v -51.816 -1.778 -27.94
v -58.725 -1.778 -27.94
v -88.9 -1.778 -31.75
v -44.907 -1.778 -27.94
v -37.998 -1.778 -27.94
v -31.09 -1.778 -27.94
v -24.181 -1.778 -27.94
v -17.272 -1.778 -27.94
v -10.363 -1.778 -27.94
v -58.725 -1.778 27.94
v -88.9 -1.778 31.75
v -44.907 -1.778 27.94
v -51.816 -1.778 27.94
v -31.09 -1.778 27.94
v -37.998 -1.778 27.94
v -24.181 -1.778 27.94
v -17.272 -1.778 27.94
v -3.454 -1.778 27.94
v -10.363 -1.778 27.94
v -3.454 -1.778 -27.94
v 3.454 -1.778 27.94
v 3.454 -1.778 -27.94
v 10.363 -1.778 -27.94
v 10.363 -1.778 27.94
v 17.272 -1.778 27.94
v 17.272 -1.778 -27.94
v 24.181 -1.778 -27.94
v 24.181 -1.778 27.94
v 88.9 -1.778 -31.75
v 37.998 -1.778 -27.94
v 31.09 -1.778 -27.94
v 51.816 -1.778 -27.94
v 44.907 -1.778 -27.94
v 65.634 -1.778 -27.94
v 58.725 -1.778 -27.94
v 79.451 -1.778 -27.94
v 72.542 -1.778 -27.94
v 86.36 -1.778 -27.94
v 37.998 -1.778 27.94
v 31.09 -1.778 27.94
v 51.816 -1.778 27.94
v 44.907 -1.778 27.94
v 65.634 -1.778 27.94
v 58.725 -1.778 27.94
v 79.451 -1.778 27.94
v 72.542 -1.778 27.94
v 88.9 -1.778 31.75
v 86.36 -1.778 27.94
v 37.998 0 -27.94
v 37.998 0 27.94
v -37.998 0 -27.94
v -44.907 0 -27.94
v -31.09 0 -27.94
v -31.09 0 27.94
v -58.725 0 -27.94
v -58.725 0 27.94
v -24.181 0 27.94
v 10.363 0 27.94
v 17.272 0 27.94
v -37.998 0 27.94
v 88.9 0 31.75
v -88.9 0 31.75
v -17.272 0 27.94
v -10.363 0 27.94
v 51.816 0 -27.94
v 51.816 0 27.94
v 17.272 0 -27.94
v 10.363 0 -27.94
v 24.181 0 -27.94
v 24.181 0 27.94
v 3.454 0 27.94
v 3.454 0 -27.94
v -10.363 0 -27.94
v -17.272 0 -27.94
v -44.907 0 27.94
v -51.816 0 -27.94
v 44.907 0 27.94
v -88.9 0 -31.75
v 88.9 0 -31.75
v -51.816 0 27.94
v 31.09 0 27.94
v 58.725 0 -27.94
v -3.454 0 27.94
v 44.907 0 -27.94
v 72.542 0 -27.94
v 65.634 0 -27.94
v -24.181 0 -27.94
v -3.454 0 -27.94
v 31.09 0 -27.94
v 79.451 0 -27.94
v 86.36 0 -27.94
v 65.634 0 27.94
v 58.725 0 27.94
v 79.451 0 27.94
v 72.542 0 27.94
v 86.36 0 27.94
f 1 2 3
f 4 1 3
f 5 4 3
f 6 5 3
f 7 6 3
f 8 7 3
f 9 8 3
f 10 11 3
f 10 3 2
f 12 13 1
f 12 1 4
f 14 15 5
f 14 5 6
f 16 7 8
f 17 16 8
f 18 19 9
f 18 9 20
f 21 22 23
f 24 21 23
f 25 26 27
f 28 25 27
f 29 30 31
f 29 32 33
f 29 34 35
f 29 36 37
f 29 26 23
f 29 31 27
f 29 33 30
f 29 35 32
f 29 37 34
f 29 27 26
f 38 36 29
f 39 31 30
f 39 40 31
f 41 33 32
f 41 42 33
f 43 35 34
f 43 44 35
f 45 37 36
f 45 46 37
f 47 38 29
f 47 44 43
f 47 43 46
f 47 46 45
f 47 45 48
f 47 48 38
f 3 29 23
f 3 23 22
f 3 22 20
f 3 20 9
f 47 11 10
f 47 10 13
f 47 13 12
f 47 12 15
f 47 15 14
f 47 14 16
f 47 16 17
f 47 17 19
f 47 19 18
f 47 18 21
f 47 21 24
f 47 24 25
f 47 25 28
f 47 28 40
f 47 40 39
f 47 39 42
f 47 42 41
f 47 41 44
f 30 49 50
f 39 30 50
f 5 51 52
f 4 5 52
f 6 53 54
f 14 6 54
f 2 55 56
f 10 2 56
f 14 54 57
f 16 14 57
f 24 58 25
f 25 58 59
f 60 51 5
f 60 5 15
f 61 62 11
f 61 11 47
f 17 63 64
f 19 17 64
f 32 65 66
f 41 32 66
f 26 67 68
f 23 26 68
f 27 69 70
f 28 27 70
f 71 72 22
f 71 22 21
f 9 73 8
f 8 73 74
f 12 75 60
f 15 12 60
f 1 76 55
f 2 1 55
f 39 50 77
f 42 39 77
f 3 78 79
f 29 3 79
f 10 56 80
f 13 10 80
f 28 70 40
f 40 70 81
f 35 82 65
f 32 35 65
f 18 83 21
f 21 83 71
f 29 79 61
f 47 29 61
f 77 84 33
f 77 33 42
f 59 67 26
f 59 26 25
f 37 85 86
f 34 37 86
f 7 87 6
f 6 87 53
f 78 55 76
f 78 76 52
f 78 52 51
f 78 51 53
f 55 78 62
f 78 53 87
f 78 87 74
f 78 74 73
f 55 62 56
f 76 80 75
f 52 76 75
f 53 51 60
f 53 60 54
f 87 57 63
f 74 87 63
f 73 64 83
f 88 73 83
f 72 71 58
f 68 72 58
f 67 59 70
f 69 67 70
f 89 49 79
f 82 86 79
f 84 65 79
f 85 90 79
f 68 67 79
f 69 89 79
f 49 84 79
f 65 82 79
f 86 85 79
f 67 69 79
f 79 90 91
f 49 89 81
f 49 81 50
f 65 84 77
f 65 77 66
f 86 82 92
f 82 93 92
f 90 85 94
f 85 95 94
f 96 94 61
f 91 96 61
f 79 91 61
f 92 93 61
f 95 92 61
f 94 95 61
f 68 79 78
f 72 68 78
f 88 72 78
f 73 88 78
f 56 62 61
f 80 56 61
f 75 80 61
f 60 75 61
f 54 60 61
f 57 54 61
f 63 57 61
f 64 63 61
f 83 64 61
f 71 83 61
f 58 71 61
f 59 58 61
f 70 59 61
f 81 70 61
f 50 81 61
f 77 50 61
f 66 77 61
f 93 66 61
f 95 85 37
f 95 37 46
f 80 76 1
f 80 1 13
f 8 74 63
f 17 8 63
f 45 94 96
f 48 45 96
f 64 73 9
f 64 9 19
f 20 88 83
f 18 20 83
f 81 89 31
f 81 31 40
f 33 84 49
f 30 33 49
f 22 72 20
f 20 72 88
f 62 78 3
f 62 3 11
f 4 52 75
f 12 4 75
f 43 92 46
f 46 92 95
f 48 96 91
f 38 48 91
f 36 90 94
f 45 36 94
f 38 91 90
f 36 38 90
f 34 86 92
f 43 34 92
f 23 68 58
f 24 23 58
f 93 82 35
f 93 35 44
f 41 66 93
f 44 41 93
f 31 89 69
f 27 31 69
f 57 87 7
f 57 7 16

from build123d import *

# Parameters (mm, degrees)
F0_W     = 177.8
F0_H     = 63.5
F0_W_2   = 6.9088
F0_H_2   = 55.88
F1_DEPTH = 1.778
F2_W     = 20.7264
F2_H     = 55.88
F3_DEPTH = 1.778


with BuildPart() as f1:
    # F0 (on Front) → F1 (new body)
    with BuildSketch(Plane.XZ):
        Rectangle(F0_W, F0_H)
        Polygon((86.36, 27.94), (86.36, -27.94), (79.4512, -27.94), (72.5424, -27.94), (65.6336, -27.94), (58.7248, -27.94), (51.816, -27.94), (44.9072, -27.94), (37.9984, -27.94), (31.0896, -27.94), (24.1808, -27.94), (17.272, -27.94), (10.3632, -27.94), (3.4544, -27.94), (-3.4544, -27.94), (-10.3632, -27.94), (-17.272, -27.94), (-24.1808, -27.94), (-31.0896, -27.94), (-37.9984, -27.94), (-44.9072, -27.94), (-51.816, -27.94), (-58.7248, -27.94), (-65.6336, -27.94), (-72.5424, -27.94), (-79.4512, -27.94), (-86.36, -27.94), (-86.36, 27.94), (-79.4512, 27.94), (-72.5424, 27.94), (-65.6336, 27.94), (-58.7248, 27.94), (-51.816, 27.94), (-44.9072, 27.94), (-37.9984, 27.94), (-31.0896, 27.94), (-24.1808, 27.94), (-17.272, 27.94), (-10.3632, 27.94), (-3.4544, 27.94), (3.4544, 27.94), (10.3632, 27.94), (17.272, 27.94), (24.1808, 27.94), (31.0896, 27.94), (37.9984, 27.94), (44.9072, 27.94), (51.816, 27.94), (58.7248, 27.94), (65.6336, 27.94), (72.5424, 27.94), (79.4512, 27.94), align=None, mode=Mode.SUBTRACT)
        with Locations((-75.9968, 0)):
            Rectangle(F0_W_2, F0_H_2)
        with Locations((-62.1792, 0)):
            Rectangle(F0_W_2, F0_H_2)
        with Locations((-48.3616, 0)):
            Rectangle(F0_W_2, F0_H_2)
        with Locations((-34.544, 0)):
            Rectangle(F0_W_2, F0_H_2)
        with Locations((-20.7264, 0)):
            Rectangle(F0_W_2, F0_H_2)
        with Locations((-6.9088, 0)):
            Rectangle(F0_W_2, F0_H_2)
        with Locations((6.9088, 0)):
            Rectangle(F0_W_2, F0_H_2)
        with Locations((20.7264, 0)):
            Rectangle(F0_W_2, F0_H_2)
        with Locations((34.544, 0)):
            Rectangle(F0_W_2, F0_H_2)
        with Locations((48.3616, 0)):
            Rectangle(F0_W_2, F0_H_2)
        with Locations((62.1792, 0)):
            Rectangle(F0_W_2, F0_H_2)
        with Locations((75.9968, 0)):
            Rectangle(F0_W_2, F0_H_2)
    extrude(amount=F1_DEPTH)

    # F2 (on face) → F3 (join)
    with BuildSketch(Plane.XZ.offset(1.778)):
        with Locations((-75.9968, 0)):
            Rectangle(F2_W, F2_H)
    extrude(amount=-F3_DEPTH)


solid = f1.part
